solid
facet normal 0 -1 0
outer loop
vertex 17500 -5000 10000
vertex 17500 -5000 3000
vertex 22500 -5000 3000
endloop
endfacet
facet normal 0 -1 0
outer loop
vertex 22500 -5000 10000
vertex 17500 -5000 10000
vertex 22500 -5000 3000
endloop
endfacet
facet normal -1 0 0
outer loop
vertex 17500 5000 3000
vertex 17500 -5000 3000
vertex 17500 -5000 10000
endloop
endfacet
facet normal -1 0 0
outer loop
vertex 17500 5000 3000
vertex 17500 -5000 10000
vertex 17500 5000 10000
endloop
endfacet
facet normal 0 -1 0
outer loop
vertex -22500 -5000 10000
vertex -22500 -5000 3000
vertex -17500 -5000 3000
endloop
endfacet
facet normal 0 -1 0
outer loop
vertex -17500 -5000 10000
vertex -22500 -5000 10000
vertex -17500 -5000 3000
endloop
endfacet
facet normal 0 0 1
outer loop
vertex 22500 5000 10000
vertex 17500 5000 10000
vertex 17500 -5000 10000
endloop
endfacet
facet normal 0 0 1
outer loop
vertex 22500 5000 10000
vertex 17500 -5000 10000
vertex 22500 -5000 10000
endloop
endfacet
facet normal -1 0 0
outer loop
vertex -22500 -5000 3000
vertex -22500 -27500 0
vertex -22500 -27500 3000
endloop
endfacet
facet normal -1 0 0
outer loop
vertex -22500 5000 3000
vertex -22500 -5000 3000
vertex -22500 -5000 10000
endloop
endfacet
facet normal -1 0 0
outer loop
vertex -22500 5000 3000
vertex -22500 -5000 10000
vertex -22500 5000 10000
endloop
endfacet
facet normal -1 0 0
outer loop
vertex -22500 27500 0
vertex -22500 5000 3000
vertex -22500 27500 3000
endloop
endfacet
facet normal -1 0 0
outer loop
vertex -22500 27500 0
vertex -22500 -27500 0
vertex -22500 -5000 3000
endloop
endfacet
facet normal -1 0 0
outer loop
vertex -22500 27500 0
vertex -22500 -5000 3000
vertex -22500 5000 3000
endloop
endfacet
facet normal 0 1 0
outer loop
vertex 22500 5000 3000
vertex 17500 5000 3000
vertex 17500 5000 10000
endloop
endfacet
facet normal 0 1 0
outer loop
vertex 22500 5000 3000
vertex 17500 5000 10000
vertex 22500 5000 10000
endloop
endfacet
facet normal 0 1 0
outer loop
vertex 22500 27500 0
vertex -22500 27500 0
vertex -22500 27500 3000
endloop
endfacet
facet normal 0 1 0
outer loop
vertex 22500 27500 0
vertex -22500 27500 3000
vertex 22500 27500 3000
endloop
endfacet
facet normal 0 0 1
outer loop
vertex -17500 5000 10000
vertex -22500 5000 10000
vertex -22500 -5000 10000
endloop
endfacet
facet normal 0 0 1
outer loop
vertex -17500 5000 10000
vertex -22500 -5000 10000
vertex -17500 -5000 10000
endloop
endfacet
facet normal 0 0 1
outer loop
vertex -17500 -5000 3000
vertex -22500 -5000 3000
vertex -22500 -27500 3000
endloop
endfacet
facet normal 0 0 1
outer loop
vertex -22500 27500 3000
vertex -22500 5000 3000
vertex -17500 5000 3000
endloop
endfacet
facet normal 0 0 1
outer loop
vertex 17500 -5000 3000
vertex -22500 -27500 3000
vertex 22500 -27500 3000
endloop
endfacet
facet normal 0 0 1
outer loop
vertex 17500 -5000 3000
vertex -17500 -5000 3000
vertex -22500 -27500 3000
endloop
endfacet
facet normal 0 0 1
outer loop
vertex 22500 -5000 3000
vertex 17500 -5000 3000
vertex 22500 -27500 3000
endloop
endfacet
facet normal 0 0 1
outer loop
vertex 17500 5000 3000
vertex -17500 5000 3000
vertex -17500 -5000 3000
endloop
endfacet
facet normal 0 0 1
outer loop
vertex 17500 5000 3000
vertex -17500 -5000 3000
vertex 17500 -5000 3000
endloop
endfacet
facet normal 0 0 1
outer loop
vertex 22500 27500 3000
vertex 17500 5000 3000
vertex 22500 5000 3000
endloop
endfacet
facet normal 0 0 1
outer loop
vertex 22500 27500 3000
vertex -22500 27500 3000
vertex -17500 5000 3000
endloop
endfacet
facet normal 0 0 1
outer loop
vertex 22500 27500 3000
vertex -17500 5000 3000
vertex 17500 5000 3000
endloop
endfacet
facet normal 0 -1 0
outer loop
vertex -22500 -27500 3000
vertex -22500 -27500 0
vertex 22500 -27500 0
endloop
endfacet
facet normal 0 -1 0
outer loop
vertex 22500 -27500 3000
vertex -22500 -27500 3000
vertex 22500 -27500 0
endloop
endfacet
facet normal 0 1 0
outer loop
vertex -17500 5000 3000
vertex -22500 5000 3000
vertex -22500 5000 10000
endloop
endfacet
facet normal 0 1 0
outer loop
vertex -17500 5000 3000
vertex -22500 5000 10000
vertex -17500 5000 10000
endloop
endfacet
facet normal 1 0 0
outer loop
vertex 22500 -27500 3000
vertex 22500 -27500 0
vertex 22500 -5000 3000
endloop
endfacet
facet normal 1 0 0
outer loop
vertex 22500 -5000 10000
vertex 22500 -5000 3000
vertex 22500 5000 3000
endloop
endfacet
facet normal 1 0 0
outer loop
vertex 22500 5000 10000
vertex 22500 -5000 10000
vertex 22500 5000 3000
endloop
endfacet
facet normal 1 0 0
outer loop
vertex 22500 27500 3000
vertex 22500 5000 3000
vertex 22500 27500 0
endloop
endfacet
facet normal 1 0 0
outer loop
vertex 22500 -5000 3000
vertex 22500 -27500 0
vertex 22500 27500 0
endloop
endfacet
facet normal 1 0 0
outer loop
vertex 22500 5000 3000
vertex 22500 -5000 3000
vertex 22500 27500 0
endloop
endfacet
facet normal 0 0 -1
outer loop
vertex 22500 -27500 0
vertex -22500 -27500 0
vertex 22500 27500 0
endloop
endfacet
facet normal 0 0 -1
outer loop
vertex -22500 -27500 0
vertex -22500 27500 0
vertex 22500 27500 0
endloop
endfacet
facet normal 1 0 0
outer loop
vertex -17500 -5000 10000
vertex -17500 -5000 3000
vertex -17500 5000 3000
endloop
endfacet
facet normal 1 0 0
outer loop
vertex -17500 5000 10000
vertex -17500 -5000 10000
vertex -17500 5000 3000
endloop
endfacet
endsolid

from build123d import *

# Parameters (mm, degrees)
SKETCH1_W           = 45000
SKETCH1_H           = 55000
BOSS_EXTRUDE1_DEPTH = 3000
SKETCH3_W           = 5000
SKETCH3_H           = 10000
BOSS_EXTRUDE2_DEPTH = 10000


with BuildPart() as part:
    # Sketch1 → Boss-Extrude1 (new body)
    with BuildSketch(Plane.XY):
        Rectangle(SKETCH1_W, SKETCH1_H)
    extrude(amount=BOSS_EXTRUDE1_DEPTH)

    # Sketch3 → Boss-Extrude2 (add)
    with BuildSketch(Plane.XY):
        with Locations((-20000, 0)):
            Rectangle(SKETCH3_W, SKETCH3_H)
        with Locations((20000, 0)):
            Rectangle(SKETCH3_W, SKETCH3_H)
    extrude(amount=BOSS_EXTRUDE2_DEPTH)


solid = part.part
